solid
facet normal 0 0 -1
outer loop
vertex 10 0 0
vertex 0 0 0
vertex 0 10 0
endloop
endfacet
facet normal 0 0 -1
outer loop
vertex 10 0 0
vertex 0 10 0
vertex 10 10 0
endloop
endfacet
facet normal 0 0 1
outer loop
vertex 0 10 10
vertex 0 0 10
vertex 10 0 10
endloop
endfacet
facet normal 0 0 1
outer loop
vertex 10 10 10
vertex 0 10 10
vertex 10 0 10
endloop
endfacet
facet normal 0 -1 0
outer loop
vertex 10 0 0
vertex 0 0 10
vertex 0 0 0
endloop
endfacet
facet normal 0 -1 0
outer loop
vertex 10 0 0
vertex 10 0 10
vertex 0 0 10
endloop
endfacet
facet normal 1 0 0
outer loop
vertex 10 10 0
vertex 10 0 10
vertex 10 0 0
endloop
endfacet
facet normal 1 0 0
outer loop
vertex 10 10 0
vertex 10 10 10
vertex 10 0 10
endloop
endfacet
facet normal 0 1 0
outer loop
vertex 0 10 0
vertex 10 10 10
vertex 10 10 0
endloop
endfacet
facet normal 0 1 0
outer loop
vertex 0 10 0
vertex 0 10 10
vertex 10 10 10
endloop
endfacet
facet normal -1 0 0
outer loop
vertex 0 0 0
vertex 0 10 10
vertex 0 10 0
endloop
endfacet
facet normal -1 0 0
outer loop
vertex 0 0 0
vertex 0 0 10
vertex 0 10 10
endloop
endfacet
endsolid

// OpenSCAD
// segments= subdivides the outline even for a straight extrusion,
// which is otherwise never subdivided: each side of the square is split
// in two, giving 8 vertices per ring.
linear_extrude(height = 10, segments = 8) square(10);
